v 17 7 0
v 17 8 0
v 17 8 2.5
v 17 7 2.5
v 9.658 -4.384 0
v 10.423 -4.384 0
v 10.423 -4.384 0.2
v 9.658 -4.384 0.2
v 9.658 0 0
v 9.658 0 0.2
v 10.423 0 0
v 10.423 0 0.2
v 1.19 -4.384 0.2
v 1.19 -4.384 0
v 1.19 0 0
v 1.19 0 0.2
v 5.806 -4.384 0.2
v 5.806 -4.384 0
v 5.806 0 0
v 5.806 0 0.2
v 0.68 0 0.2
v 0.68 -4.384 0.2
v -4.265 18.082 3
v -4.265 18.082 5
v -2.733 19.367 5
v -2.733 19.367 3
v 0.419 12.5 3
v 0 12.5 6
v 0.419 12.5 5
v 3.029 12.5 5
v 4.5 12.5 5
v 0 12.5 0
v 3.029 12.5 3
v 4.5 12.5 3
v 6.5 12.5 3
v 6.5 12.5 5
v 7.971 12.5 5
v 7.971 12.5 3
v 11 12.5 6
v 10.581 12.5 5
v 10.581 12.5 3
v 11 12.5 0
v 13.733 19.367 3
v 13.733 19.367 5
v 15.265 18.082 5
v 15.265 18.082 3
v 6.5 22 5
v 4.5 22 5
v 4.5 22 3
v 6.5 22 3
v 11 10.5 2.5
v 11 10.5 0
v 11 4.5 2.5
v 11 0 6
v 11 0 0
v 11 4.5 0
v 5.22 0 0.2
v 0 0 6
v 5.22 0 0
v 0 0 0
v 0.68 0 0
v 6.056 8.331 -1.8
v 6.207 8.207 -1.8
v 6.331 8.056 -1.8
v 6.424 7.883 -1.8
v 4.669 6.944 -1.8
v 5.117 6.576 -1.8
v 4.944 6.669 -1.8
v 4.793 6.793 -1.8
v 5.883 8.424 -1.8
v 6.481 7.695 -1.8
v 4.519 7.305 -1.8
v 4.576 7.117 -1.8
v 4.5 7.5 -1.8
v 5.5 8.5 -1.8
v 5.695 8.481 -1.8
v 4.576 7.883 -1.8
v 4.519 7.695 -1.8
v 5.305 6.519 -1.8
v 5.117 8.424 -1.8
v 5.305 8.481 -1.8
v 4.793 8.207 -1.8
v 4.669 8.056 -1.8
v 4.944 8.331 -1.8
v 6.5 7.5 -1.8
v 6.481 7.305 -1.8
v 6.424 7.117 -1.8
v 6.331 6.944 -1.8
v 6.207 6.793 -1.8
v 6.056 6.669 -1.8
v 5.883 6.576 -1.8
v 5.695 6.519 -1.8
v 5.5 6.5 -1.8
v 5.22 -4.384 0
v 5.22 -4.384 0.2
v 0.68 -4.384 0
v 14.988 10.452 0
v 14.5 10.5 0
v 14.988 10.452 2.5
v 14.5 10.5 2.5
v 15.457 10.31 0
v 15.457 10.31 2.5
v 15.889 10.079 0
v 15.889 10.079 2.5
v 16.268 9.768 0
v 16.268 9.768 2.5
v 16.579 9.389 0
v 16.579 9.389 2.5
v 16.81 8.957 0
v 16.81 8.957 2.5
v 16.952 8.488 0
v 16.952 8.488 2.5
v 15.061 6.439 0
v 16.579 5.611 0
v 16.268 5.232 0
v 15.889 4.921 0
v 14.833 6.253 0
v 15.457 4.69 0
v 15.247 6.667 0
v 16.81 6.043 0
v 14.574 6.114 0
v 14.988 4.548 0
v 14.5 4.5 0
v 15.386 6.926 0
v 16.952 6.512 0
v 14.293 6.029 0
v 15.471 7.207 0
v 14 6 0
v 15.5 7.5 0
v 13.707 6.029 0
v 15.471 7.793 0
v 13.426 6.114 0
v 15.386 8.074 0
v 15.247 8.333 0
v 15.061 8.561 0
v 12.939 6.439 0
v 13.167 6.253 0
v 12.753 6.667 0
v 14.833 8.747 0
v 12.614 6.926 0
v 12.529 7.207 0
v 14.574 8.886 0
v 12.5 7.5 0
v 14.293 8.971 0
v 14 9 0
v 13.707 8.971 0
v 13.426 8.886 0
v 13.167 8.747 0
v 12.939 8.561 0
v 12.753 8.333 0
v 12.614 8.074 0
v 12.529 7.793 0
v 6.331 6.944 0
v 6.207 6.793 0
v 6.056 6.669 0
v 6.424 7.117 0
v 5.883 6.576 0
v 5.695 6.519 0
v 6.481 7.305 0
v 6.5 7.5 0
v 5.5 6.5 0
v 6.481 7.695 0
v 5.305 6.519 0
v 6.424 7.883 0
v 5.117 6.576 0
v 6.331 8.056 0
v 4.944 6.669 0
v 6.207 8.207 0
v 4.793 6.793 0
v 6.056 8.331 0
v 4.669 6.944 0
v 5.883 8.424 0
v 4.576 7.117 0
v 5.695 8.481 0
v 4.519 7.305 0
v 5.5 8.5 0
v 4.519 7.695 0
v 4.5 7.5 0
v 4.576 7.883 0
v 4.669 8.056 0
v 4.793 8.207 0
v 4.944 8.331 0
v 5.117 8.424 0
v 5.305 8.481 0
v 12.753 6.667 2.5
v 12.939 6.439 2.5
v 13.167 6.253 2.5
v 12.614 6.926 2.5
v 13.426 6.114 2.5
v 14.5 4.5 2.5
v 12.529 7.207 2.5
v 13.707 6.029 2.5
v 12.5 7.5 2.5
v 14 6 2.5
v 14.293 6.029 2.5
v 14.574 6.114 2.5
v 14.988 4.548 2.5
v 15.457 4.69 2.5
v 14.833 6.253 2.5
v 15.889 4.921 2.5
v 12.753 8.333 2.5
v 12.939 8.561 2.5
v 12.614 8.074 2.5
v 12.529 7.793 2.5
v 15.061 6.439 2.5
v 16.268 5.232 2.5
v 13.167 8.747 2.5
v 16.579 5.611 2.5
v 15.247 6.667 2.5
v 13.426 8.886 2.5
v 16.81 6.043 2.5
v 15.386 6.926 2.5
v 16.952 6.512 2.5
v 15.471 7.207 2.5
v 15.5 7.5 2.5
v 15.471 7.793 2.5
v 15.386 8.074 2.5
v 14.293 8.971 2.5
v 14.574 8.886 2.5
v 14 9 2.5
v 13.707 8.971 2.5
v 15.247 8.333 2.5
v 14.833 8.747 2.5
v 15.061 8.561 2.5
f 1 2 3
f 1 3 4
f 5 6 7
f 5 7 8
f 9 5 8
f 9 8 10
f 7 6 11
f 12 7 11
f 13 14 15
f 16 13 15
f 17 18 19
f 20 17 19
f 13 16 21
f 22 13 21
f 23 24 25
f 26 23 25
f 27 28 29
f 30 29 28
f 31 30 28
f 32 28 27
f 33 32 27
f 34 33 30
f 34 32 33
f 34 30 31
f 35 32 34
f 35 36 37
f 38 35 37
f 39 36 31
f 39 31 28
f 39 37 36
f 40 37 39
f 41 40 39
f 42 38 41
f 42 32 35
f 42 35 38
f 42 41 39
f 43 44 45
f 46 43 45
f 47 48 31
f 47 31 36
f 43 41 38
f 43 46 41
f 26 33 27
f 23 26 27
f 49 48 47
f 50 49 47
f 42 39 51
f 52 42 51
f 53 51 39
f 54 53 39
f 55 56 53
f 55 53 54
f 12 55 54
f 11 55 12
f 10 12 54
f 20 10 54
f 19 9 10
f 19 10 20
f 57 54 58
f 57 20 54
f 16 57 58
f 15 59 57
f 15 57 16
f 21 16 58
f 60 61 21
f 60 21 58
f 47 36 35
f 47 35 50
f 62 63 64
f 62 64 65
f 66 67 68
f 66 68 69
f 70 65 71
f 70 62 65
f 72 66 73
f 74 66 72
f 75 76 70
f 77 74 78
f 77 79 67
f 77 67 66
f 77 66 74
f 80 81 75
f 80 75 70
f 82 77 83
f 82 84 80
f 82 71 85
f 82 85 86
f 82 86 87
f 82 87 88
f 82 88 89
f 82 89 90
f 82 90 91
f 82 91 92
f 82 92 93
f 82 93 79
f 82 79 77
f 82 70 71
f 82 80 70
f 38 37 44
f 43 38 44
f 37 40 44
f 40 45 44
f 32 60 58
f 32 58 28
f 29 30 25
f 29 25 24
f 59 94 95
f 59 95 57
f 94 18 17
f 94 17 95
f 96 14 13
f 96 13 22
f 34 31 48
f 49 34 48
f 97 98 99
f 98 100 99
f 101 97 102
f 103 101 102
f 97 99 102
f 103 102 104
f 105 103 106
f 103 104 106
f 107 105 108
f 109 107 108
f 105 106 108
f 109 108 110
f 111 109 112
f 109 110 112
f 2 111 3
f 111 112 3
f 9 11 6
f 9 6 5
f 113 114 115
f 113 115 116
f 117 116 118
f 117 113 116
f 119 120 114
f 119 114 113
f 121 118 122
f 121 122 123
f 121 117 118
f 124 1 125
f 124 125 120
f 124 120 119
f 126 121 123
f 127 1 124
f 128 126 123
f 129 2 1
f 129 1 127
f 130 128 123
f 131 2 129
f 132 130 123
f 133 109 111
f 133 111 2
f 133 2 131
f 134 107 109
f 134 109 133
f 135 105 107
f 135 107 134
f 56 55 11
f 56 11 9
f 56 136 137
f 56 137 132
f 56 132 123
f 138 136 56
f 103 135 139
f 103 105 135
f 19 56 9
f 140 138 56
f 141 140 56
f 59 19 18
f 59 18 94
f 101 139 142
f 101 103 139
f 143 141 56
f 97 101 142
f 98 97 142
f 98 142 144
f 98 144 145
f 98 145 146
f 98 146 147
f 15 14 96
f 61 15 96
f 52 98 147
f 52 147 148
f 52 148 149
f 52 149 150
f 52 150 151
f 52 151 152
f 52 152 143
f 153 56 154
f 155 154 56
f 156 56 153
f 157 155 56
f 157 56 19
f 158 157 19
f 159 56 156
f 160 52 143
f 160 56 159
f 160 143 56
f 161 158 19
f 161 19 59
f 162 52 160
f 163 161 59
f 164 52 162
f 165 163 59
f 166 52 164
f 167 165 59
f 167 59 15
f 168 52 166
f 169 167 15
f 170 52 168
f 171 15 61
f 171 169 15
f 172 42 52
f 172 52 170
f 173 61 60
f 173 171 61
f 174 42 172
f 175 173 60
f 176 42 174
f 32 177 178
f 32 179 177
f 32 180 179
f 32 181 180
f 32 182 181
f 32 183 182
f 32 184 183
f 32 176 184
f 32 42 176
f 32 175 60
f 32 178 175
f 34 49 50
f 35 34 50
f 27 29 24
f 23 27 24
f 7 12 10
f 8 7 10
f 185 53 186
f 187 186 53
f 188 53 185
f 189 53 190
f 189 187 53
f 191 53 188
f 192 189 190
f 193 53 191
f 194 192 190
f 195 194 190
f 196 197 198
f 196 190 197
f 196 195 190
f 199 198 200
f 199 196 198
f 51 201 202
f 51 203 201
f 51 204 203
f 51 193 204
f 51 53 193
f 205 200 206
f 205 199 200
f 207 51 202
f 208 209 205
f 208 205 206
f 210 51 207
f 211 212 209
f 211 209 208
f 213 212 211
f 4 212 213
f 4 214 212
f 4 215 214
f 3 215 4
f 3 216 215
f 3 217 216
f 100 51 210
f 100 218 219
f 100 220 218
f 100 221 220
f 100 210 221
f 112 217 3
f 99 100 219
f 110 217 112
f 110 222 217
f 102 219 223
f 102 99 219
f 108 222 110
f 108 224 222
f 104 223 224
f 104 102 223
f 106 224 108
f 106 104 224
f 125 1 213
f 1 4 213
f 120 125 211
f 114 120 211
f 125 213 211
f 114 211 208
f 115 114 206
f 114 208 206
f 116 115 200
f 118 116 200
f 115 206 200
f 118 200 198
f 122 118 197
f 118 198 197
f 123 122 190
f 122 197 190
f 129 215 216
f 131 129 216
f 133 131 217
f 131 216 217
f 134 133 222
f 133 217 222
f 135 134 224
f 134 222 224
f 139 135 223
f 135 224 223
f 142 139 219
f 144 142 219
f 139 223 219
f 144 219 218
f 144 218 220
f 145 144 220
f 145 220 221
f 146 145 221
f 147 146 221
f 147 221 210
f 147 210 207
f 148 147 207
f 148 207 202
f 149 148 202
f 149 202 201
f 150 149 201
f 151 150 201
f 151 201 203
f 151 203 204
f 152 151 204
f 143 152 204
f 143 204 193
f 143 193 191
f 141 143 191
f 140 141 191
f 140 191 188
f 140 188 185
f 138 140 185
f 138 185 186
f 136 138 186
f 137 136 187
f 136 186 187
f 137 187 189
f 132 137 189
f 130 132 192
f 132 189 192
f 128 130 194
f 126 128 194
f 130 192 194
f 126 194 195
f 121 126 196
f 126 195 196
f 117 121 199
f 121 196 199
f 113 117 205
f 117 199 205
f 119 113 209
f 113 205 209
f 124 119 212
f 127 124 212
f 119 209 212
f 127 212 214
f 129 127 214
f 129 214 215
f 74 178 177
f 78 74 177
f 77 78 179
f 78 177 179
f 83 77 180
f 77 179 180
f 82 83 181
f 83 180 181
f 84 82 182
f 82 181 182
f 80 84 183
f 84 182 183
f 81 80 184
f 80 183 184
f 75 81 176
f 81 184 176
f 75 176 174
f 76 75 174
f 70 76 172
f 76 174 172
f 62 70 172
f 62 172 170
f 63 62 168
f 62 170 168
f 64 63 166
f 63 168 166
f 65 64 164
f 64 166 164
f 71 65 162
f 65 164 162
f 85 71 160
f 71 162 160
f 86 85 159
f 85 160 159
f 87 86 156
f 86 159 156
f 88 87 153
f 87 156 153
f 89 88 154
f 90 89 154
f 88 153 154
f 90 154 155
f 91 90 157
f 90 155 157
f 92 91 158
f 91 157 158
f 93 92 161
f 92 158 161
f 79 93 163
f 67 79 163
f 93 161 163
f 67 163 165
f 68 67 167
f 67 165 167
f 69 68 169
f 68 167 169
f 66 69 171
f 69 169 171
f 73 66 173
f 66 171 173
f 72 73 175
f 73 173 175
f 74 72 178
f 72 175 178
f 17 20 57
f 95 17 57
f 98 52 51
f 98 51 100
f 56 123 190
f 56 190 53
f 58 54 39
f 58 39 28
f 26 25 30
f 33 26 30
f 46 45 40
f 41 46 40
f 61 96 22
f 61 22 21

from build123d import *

# Parameters (mm, degrees)
P_IDAT_VYSUNUT_M1_DEPTH  = 6
SKICA2_W                 = 6
SKICA2_H                 = 6
ODEBRAT_VYSUNUT_M1_DEPTH = 3.5
SKICA3_R                 = 1.5
ODEBRAT_VYSUNUT_M2_DEPTH = 3.5
SKICA4_W                 = 0.765185498
SKICA4_H                 = 4.384382678
SKICA4_W_2               = 0.586642215
SKICA4_W_3               = 0.510123665
P_IDAT_VYSUNUT_M2_DEPTH  = 0.2
SKICA5_W                 = 2
SKICA5_H                 = 9.5
P_IDAT_VYSUNUT_M3_DEPTH  = 2
SKICA6_R                 = 1
P_IDAT_VYSUNUT_M4_DEPTH  = 1.8
ZAOBLIT1_R               = 2.5


with BuildPart() as part:
    # Skica1 → Přidat vysunutím1 (new body)
    with BuildSketch(Plane.XY):
        Polygon((0, 0), (0, 12.5), (11, 12.5), (11, 10.5), (17, 10.5), (17, 4.5), (11, 4.5), (11, 0), align=None)
    extrude(amount=P_IDAT_VYSUNUT_M1_DEPTH)

    # Skica2 → Odebrat vysunutím1 (cut)
    with BuildSketch(Plane.XY.offset(6)):
        with Locations((14, 7.5)):
            Rectangle(SKICA2_W, SKICA2_H)
    extrude(amount=-ODEBRAT_VYSUNUT_M1_DEPTH, mode=Mode.SUBTRACT)

    # Skica3 → Odebrat vysunutím2 (cut)
    with BuildSketch(Plane.XY.offset(2.5)):
        with Locations((14, 7.5)):
            Circle(SKICA3_R)
    extrude(amount=-ODEBRAT_VYSUNUT_M2_DEPTH, mode=Mode.SUBTRACT)

    # Skica4 → Přidat vysunutím2 (add)
    with BuildSketch(Plane(origin=(0, 0, 0), x_dir=(-1, 0, 0), z_dir=(0, 0, -1))):
        with Locations((-10.040395208, -2.192191339)):
            Rectangle(SKICA4_W, SKICA4_H)
        with Locations((-5.513047674, -2.192191339)):
            Rectangle(SKICA4_W_2, SKICA4_H)
        with Locations((-0.934687773, -2.192191339)):
            Rectangle(SKICA4_W_3, SKICA4_H)
    extrude(amount=-P_IDAT_VYSUNUT_M2_DEPTH)

    # Skica5 → Přidat vysunutím3 (add)
    with BuildSketch(Plane.XY.offset(5)):
        with Locations((5.5, 17.25)):
            Rectangle(SKICA5_W, SKICA5_H)
        Polygon((7.6264998, 12.089987604), (13.732982092, 19.367409813), (15.265070979, 18.081834594), (9.158588687, 10.804412384), align=None)
        Polygon((1.841411313, 10.804412384), (-4.265070979, 18.081834594), (-2.732982092, 19.367409813), (3.3735002, 12.089987604), align=None)
    extrude(amount=-P_IDAT_VYSUNUT_M3_DEPTH)

    # Skica6 → Přidat vysunutím4 (add)
    with BuildSketch(Plane(origin=(0, 0, 0), x_dir=(-1, 0, 0), z_dir=(0, 0, -1))):
        with Locations((-5.5, 7.5)):
            Circle(SKICA6_R)
    extrude(amount=P_IDAT_VYSUNUT_M4_DEPTH)

    # Zaoblit1
    zaoblit1_edges = [part.edges().sort_by_distance(p)[0] for p in [
        (17, 10.5, 1.25),
        (17, 4.5, 1.25),
    ]]
    fillet(zaoblit1_edges, radius=ZAOBLIT1_R)


solid = part.part
